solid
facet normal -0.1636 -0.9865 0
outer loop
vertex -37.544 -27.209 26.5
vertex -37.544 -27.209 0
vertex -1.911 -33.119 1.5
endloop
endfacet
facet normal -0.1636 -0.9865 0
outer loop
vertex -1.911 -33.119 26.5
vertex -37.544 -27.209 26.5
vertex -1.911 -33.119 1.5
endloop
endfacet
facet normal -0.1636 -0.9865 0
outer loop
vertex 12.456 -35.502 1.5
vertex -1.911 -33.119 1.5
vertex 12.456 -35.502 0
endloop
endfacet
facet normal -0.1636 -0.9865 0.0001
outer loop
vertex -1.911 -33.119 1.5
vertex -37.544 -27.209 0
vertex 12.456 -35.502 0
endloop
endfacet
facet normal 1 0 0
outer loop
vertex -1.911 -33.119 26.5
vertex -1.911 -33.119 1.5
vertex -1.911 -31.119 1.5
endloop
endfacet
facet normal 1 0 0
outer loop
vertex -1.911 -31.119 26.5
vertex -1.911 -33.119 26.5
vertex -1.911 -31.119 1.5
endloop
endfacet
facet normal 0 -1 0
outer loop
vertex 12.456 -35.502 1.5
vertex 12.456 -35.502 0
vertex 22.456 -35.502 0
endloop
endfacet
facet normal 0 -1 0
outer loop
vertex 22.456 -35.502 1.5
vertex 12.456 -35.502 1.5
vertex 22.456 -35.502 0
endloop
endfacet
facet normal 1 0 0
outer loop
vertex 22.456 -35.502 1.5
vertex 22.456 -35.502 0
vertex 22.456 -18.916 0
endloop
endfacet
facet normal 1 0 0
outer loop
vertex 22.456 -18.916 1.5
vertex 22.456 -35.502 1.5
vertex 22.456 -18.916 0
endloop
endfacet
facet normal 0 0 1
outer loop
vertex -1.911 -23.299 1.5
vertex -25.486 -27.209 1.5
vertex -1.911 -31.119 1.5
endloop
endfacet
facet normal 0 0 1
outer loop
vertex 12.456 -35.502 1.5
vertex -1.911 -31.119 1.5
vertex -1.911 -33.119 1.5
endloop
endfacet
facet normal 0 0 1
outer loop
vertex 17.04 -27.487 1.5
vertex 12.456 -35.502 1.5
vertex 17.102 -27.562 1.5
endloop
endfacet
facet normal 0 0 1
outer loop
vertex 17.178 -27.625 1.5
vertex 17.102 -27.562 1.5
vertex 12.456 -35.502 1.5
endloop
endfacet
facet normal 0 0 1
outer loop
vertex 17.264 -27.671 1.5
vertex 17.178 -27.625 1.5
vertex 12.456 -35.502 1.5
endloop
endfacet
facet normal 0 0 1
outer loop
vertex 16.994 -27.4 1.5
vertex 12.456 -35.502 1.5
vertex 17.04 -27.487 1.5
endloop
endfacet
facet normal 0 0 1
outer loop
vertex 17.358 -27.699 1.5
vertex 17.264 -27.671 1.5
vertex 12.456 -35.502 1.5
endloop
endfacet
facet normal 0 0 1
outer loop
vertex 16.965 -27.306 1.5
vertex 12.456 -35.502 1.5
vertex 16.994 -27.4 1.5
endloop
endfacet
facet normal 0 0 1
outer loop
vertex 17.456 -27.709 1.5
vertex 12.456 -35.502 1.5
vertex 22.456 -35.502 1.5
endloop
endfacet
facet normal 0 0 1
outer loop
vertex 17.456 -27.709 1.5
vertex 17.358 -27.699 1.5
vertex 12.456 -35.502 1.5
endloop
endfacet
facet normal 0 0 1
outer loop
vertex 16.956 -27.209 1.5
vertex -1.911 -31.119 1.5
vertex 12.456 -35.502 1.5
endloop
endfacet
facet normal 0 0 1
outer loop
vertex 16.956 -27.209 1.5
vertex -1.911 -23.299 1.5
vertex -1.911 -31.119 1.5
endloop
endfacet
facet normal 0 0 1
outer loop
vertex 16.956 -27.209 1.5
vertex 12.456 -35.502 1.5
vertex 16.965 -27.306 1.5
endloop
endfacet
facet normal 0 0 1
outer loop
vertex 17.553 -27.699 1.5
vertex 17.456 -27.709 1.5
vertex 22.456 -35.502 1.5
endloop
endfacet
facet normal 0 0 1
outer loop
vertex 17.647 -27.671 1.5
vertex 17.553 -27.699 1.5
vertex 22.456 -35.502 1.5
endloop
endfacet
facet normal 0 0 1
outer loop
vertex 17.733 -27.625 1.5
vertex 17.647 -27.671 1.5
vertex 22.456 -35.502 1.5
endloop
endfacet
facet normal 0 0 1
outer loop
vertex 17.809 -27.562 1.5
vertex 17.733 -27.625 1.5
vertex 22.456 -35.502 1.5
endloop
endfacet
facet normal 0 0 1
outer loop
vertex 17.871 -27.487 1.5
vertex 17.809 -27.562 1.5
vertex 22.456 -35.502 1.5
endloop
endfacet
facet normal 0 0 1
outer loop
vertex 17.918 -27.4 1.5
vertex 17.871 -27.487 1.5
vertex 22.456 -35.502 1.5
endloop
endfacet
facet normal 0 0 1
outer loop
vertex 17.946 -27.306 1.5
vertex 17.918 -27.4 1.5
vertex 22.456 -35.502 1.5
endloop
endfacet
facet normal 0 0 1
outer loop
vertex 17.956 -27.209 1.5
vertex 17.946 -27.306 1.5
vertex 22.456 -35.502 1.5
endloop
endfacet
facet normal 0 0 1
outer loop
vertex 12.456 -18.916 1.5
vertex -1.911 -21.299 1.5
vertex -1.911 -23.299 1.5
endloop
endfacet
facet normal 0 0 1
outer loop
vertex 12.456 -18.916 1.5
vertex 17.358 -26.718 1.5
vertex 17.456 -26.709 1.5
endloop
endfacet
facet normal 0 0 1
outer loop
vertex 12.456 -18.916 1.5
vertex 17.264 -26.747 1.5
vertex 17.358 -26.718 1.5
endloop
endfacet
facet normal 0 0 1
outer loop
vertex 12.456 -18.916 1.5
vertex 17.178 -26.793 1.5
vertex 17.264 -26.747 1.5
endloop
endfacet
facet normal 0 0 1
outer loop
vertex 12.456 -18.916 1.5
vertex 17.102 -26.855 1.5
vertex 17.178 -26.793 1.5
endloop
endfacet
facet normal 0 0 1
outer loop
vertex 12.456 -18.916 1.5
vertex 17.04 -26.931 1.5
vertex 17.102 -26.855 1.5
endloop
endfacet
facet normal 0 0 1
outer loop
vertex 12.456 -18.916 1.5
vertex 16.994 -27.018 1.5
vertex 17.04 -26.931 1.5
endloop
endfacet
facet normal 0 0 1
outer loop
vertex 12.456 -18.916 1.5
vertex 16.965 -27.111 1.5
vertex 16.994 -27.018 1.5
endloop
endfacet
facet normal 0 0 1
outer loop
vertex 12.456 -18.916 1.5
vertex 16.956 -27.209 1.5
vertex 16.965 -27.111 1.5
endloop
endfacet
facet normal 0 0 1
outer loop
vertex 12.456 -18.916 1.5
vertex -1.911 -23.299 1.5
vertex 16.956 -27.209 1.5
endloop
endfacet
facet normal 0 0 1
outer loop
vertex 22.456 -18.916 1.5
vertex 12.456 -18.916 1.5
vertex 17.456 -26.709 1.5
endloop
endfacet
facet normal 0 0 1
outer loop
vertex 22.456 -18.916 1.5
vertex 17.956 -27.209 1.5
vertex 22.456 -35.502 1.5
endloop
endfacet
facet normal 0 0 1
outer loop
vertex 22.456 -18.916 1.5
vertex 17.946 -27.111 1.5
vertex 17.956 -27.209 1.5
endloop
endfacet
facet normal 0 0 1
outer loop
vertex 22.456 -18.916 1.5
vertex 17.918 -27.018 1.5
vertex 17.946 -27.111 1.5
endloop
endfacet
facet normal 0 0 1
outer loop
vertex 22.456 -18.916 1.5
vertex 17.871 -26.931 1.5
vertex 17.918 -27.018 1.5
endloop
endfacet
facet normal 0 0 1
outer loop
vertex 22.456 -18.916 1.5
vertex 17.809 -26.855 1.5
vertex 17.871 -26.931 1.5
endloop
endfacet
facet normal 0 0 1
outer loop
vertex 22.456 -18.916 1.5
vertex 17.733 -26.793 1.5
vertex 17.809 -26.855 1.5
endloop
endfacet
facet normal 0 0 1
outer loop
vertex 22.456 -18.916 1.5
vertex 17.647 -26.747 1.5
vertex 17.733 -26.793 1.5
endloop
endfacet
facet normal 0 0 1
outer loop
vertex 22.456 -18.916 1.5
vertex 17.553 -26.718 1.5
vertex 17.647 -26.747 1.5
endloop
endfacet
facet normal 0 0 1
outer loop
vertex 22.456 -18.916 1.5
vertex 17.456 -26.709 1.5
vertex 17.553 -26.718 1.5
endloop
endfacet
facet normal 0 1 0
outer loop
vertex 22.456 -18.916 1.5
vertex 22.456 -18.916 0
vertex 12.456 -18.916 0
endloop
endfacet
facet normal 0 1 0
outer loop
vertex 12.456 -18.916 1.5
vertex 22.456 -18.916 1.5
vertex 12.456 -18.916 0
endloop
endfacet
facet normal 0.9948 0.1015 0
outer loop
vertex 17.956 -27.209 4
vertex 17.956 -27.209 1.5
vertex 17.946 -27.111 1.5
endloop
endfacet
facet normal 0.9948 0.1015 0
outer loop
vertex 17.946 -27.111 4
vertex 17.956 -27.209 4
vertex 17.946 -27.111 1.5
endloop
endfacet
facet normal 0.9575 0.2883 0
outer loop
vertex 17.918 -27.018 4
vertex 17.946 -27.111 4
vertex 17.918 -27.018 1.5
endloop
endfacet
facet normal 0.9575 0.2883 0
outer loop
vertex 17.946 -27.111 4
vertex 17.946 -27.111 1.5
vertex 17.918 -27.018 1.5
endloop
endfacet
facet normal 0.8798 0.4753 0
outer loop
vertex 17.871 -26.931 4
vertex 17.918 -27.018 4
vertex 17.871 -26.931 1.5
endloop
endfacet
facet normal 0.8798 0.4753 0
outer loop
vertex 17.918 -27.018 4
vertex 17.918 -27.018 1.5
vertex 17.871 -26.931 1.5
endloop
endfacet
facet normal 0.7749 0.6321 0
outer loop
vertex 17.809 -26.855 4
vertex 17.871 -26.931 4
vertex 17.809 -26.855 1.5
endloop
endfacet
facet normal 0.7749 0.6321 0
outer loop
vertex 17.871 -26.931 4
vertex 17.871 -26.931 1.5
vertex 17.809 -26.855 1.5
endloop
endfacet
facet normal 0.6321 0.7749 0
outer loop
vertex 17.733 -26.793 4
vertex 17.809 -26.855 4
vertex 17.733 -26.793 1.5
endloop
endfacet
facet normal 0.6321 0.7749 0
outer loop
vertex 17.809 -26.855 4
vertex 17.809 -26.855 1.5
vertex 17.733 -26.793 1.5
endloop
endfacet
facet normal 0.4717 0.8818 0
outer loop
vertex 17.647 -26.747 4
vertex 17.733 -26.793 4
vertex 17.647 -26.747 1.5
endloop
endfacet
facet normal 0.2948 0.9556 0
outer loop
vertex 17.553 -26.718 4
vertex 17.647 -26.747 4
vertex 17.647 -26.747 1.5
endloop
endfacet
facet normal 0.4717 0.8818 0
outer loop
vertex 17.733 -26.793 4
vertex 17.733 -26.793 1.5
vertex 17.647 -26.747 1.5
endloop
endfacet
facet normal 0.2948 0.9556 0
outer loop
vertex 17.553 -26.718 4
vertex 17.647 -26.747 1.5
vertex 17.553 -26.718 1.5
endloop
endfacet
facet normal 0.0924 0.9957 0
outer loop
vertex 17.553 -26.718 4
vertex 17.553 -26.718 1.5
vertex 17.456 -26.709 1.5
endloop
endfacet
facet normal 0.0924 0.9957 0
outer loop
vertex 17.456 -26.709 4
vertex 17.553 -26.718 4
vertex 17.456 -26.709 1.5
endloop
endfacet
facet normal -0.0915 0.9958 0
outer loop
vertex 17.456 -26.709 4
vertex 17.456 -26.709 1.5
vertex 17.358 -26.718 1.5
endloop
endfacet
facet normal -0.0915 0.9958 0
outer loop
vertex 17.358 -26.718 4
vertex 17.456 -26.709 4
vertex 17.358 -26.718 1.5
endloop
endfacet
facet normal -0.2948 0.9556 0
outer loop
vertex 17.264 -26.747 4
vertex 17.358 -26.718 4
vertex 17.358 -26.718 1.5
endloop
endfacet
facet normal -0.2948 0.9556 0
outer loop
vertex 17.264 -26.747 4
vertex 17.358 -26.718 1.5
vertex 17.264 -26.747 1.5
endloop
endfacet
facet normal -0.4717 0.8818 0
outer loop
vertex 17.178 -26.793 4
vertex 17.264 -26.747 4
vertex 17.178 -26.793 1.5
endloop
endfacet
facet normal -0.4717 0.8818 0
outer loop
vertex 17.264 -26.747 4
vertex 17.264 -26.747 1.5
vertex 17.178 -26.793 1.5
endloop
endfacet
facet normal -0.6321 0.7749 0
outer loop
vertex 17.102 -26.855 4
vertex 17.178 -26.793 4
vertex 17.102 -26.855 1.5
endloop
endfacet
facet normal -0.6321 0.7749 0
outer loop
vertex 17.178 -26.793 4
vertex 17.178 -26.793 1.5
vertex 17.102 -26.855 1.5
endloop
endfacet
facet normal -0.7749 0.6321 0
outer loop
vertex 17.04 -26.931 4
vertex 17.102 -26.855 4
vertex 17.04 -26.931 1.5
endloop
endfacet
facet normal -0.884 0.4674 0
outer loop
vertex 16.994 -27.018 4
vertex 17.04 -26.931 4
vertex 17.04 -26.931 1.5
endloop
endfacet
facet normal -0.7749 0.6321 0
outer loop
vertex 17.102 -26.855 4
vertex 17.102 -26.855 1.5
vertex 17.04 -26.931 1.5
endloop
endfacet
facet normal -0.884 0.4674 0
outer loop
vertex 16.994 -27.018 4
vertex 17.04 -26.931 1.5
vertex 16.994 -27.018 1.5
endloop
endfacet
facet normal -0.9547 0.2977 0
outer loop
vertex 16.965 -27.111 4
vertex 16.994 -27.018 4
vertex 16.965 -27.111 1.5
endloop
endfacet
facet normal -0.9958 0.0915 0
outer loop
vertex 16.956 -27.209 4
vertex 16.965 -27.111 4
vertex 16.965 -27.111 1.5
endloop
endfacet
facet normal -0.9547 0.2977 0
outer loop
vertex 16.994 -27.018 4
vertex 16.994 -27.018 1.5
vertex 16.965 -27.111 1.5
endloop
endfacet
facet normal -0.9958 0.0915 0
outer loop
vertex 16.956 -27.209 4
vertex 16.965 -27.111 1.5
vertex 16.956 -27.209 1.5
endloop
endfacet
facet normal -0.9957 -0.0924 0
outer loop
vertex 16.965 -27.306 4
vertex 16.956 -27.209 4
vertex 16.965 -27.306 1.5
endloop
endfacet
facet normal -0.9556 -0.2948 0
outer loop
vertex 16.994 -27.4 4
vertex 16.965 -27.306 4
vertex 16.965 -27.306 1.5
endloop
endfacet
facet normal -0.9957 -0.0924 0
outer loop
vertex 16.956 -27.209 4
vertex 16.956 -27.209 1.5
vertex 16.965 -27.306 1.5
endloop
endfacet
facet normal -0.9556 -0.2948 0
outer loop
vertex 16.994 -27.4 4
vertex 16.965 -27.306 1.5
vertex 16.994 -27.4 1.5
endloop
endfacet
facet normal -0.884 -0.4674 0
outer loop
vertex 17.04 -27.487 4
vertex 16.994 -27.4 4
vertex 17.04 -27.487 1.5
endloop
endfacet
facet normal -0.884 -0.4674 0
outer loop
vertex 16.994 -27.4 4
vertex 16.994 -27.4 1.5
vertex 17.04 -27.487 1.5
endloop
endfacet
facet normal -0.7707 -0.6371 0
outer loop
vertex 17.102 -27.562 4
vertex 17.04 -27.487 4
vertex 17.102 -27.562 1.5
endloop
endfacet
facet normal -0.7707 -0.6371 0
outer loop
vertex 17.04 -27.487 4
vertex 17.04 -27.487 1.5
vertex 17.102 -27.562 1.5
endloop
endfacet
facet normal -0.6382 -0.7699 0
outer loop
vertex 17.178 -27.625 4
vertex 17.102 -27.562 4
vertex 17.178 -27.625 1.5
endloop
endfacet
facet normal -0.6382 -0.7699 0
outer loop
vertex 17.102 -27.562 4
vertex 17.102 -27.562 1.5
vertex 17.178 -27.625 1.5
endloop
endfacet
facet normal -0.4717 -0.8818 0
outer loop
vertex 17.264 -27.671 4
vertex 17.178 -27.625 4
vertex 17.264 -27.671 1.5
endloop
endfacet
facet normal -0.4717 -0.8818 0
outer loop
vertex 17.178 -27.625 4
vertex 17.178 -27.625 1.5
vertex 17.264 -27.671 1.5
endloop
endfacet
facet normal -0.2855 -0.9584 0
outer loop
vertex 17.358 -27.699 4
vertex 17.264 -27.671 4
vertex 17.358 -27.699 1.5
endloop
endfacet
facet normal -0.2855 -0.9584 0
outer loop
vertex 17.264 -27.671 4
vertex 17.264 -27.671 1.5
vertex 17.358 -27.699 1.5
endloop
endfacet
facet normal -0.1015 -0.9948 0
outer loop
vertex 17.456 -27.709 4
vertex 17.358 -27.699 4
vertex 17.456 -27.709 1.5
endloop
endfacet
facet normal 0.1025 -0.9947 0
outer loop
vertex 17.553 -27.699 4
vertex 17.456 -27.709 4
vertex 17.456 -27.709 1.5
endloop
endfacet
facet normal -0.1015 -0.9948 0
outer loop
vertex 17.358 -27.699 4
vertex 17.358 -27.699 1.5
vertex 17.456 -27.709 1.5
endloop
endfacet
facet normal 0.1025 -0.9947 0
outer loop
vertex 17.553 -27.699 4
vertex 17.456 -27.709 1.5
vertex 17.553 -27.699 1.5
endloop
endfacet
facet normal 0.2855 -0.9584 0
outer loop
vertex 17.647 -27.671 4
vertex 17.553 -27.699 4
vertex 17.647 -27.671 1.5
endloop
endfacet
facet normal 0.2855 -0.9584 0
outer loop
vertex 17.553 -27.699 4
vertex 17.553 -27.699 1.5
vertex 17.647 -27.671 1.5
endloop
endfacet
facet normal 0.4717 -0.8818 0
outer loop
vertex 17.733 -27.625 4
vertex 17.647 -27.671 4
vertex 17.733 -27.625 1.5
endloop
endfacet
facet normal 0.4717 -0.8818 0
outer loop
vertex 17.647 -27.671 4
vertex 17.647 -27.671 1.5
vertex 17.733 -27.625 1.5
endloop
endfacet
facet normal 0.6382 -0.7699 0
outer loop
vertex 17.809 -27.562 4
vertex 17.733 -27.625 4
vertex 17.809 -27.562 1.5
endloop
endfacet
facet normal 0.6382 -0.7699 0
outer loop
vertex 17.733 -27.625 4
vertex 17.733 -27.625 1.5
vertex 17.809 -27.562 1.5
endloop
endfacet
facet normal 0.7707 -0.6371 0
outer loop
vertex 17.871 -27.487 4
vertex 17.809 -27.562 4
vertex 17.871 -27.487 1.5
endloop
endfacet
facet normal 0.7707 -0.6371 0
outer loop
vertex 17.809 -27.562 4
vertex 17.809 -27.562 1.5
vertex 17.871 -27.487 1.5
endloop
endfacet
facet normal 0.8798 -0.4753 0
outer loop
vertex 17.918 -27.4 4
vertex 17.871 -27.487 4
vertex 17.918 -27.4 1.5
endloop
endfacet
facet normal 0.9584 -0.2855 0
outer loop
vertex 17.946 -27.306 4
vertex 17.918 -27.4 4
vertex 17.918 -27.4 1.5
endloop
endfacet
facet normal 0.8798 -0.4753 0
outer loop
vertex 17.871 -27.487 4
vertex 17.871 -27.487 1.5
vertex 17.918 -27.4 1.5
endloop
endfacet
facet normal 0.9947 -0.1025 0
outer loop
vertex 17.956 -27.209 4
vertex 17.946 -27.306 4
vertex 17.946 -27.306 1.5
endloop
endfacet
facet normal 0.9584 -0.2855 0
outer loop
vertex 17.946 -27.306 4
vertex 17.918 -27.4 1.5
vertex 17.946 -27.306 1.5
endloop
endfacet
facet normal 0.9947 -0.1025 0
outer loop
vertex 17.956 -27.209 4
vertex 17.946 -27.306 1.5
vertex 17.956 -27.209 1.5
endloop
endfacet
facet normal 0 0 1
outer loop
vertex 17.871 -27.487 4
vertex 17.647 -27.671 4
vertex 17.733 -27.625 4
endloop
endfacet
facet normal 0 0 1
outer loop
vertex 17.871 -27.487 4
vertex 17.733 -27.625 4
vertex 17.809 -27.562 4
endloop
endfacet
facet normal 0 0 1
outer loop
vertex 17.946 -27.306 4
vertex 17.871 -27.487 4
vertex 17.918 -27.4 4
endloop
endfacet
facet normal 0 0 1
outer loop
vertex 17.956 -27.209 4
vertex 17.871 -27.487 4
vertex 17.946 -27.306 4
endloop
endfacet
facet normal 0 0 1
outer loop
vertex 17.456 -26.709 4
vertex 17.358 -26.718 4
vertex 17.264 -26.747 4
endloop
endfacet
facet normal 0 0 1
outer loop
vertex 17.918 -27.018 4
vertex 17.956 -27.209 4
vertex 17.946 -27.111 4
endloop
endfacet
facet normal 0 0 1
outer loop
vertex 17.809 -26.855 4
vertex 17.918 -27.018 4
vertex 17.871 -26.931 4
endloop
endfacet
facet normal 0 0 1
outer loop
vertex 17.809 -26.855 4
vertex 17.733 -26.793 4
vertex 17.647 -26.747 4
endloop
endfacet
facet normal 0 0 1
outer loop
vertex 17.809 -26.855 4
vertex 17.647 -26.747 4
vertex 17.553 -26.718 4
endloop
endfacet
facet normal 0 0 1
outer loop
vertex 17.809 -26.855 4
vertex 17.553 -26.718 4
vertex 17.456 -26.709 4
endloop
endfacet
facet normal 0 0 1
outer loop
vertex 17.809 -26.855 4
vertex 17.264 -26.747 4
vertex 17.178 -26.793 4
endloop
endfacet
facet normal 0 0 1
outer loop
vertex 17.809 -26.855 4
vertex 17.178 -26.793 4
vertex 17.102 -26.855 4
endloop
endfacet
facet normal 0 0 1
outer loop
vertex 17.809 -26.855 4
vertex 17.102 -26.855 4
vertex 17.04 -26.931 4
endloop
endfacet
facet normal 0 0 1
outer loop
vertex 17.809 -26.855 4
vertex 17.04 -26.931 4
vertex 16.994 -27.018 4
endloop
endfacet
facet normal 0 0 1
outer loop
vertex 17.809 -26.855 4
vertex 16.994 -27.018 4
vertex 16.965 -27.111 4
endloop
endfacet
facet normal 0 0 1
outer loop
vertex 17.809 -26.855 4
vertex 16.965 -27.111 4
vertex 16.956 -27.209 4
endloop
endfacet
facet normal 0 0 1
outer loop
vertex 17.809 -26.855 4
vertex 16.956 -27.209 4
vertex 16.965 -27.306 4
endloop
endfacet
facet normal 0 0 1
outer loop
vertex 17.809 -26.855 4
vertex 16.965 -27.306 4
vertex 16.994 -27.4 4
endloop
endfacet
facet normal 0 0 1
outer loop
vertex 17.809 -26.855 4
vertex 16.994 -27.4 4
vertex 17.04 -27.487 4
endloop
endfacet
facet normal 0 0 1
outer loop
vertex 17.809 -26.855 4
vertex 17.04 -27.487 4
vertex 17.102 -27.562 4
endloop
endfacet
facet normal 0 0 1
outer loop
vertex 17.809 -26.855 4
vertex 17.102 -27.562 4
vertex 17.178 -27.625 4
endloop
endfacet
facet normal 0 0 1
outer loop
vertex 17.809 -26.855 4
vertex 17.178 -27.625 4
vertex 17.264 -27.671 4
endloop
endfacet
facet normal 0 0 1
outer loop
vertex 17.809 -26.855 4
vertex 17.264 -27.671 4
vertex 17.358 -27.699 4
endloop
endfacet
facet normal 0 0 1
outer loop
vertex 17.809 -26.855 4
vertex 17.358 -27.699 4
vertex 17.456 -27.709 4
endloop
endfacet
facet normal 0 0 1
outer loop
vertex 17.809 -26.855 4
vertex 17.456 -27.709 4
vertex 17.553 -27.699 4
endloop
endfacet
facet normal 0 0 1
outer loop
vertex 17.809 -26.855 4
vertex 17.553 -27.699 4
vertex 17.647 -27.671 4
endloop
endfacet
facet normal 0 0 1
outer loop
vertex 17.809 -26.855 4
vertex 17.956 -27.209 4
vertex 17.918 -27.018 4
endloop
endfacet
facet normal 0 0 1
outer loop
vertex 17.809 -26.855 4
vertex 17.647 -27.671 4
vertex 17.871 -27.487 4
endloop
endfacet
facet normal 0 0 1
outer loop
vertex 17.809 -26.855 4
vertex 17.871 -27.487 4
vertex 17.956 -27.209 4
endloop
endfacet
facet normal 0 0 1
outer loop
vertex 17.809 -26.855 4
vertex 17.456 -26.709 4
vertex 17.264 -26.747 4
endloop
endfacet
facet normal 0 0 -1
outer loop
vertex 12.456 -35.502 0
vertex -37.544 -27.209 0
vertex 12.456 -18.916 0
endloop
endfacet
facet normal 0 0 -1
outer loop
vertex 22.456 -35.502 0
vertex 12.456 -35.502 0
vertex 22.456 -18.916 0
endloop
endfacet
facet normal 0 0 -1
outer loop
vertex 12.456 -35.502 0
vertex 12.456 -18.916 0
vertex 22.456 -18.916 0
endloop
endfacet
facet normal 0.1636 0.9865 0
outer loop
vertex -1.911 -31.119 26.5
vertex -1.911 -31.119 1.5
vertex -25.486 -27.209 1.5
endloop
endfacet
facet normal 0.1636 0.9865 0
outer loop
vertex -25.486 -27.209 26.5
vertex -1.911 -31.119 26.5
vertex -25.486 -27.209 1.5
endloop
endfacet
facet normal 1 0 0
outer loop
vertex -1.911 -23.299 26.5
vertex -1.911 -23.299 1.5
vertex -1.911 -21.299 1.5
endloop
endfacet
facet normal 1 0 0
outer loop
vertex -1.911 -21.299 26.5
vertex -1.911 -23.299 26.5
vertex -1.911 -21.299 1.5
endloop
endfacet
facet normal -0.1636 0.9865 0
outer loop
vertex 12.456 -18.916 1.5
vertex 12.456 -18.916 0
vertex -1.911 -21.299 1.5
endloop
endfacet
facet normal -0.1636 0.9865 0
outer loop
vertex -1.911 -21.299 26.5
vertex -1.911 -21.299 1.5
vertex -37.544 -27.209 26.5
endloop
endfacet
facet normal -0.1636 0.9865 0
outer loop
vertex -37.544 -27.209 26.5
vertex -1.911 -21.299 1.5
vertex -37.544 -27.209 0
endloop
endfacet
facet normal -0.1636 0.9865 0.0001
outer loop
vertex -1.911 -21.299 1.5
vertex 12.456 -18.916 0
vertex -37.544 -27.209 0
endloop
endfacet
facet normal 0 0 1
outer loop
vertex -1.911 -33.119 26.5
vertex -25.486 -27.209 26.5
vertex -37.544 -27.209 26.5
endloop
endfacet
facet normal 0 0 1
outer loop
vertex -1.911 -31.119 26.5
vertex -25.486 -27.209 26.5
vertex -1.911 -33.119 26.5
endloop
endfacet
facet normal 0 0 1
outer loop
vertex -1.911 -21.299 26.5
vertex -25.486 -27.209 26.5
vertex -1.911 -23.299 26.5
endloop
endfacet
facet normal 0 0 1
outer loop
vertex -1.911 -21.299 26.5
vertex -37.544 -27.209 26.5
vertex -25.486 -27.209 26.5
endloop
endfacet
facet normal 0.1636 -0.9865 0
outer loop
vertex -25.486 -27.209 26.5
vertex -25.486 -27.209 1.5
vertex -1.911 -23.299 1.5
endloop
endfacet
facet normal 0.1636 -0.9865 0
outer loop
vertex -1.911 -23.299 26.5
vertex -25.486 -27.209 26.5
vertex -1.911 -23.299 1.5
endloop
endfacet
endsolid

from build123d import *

# Parameters (mm, degrees)
F1_DEPTH = 1.5
F3_DEPTH = 25
F4_R     = 0.5
F5_DEPTH = 2.5


# Not quite as in the source:
# - a feature names something its author has since deleted; it is built from what else it names


with BuildPart() as f1:
    # F0 (on Top) → F1 (new body)
    with BuildSketch(Plane.XY):
        Polygon((-37.5444034434, -27.2088618949), (12.4555965566, -35.5019792914), (22.4555965566, -35.5019792914), (22.4555965566, -18.9157444984), (12.4555965566, -18.9157444984), align=None)
    extrude(amount=F1_DEPTH)

    # F2 (on face) → F3 (join)
    with BuildSketch(Plane.XY.offset(1.5)):
        Polygon((-37.5444034434, -27.2088618949), (-1.9112733802, -33.1190565113), (-1.9112733802, -31.1190565113), (-25.486211666, -27.2088618949), (-1.9112733802, -23.2986672785), (-1.9112733802, -21.2986672785), align=None)
    extrude(amount=F3_DEPTH)

    # F4 (on face) → F5 (join)
    with BuildSketch(Plane.XY.offset(1.5)):
        with Locations((17.4555965566, -27.2088618949)):
            Circle(F4_R)
    extrude(amount=F5_DEPTH)


solid = f1.part
